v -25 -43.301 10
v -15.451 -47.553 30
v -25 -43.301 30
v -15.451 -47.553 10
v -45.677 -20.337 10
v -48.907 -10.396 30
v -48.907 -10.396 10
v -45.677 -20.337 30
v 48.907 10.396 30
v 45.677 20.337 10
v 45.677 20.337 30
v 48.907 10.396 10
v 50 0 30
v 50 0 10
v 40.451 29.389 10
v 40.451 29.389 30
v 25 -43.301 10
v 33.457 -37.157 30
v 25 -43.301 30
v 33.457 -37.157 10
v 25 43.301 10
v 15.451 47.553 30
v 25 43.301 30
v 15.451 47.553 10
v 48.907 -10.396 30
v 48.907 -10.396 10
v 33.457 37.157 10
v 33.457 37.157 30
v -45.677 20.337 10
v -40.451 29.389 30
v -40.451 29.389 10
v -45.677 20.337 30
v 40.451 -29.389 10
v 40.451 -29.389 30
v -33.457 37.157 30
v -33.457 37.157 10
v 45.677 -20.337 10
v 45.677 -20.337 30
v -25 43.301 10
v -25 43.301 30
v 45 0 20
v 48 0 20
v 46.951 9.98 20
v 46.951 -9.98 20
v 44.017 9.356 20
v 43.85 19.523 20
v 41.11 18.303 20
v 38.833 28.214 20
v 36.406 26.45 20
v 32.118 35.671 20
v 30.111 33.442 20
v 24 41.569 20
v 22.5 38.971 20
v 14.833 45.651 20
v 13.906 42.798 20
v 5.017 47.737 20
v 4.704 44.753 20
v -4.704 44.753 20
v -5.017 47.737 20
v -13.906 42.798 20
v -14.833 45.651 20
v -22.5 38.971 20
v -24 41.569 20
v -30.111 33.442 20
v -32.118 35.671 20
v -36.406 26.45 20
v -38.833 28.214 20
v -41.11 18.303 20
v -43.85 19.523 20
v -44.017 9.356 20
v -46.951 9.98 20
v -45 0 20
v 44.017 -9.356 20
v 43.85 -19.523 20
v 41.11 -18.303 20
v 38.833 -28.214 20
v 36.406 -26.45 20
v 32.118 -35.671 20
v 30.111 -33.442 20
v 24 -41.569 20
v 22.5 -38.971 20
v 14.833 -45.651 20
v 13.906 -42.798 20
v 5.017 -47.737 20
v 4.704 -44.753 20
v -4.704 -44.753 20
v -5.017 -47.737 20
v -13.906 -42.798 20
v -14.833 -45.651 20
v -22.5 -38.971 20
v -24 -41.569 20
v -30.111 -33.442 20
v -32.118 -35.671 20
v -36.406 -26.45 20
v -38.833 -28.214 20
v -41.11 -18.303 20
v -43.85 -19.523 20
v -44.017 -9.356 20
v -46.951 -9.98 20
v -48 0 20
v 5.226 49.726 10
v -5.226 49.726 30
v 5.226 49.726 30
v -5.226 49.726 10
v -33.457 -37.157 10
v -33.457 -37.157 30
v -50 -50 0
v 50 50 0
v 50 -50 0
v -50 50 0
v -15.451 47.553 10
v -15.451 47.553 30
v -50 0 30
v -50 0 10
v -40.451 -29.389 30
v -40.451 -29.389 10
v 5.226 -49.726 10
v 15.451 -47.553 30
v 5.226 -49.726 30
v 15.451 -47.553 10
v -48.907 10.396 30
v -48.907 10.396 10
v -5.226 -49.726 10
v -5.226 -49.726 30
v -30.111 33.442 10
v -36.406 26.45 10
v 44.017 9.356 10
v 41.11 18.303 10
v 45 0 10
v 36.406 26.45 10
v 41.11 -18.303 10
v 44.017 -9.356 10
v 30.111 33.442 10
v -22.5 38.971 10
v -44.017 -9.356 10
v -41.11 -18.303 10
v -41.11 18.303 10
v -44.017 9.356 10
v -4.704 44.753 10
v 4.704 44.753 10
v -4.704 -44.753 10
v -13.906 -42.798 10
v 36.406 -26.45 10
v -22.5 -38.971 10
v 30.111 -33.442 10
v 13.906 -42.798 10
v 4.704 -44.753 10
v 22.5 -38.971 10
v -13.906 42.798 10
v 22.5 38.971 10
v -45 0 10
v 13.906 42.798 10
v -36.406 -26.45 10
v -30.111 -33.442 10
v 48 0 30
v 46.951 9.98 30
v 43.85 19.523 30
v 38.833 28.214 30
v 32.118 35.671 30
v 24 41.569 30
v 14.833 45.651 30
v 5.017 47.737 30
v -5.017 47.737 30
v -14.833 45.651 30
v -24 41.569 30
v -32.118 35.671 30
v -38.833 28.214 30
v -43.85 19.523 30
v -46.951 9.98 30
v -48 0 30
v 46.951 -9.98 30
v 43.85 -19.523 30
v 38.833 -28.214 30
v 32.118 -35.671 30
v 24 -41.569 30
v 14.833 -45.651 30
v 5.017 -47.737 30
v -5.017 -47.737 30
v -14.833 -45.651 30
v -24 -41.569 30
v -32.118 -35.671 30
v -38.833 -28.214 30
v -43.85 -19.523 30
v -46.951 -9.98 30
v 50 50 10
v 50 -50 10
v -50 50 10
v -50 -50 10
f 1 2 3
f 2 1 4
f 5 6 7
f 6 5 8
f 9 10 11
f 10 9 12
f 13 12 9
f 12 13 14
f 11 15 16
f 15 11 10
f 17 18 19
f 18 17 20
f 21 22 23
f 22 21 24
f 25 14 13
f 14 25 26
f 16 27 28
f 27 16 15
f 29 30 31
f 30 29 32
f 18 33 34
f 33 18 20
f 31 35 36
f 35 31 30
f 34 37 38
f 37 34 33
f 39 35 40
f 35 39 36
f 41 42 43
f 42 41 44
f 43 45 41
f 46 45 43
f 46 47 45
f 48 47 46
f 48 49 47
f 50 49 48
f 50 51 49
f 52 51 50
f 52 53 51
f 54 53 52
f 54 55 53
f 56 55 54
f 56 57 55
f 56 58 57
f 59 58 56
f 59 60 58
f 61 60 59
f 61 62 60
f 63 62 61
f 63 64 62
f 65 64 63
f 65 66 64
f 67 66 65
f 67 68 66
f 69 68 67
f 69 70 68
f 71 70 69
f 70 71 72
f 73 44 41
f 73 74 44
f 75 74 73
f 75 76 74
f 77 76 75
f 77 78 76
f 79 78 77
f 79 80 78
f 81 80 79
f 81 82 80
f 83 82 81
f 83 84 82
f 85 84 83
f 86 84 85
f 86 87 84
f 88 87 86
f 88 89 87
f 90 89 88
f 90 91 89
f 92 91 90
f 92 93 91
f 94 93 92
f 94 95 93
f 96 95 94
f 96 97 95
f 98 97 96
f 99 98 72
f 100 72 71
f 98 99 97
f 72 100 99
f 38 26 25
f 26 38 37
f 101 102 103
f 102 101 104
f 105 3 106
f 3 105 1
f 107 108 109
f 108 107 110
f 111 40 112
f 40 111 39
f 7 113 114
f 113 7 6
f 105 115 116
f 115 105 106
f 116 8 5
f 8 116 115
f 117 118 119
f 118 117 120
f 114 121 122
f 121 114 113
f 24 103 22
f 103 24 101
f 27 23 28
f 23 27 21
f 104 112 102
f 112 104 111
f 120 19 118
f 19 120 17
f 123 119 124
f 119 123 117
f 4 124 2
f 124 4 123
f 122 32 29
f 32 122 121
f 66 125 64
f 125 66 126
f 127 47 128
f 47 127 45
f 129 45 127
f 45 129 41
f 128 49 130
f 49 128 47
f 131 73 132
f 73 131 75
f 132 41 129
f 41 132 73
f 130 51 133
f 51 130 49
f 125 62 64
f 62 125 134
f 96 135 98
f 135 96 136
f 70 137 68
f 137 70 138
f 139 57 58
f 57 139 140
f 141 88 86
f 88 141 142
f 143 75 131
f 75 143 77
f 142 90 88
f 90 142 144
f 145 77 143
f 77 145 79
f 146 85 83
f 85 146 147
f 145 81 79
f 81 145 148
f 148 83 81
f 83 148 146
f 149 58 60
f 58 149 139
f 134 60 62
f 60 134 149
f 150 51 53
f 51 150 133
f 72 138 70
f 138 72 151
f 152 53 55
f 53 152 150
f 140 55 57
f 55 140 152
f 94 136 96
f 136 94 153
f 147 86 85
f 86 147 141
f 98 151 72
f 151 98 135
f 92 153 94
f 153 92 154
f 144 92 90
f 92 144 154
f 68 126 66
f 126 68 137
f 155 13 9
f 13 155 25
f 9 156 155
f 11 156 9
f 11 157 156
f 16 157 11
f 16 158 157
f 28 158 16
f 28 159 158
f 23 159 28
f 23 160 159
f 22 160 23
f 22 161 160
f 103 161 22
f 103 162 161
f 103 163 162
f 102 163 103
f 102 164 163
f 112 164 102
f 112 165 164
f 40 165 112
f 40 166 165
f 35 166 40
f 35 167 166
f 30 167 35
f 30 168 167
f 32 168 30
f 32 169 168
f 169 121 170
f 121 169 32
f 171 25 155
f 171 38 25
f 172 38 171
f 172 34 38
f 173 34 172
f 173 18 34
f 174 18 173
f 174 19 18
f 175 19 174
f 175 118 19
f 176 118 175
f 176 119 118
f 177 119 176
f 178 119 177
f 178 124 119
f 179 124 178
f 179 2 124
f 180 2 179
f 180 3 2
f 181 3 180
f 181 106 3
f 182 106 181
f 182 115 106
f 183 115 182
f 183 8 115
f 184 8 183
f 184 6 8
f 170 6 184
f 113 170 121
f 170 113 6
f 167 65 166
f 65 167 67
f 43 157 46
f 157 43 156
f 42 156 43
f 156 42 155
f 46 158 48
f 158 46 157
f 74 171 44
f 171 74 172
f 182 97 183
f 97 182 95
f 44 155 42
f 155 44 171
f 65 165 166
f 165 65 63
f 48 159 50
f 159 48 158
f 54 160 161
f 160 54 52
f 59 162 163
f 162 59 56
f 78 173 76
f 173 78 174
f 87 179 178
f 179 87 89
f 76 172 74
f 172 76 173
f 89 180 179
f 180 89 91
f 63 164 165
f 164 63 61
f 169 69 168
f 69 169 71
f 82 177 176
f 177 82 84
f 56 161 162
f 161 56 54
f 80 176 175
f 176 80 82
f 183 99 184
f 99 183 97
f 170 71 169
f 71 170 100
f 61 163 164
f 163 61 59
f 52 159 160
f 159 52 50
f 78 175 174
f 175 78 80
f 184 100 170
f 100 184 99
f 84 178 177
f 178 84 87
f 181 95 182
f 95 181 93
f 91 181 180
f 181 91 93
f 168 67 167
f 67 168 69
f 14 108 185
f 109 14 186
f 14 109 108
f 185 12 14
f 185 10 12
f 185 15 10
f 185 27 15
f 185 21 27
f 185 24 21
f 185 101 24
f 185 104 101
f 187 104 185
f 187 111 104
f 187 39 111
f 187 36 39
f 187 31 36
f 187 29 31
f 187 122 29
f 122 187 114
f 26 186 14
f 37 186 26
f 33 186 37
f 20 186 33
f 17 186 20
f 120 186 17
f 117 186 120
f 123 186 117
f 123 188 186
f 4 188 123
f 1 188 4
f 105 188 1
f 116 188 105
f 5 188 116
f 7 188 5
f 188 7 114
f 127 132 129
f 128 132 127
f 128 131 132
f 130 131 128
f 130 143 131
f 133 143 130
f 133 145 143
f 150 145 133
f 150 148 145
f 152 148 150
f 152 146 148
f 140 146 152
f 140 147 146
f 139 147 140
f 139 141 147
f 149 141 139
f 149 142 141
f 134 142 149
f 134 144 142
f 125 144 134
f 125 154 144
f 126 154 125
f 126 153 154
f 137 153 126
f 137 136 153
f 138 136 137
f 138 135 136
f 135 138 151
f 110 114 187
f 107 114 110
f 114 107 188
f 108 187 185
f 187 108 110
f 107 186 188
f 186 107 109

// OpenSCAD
module ring(radius, width, height) {
	difference () {
		cylinder(r = radius, h = height);
		translate([0, 0, -1])
		cylinder(r = radius - width, h = height + 2);
	}
}


module ccube(width, depth, height, z_center = false) {
	if (z_center) {
		translate([-width / 2, -depth / 2, -height / 2])
		cube([width, depth, height]);
	} else {
		translate([-width / 2, -depth / 2, 0])
		cube([width, depth, height]);
	}
}

module twisted_ribs(outer_r, inner_r, height, twist, count, wall) {
	angle = 360 / count;
	linear_extrude(height, twist = twist, slices = 20) {
		for (i = [0 : (count - 1)]) {
			rotate([0, 0, i * angle])
			translate([0, inner_r])
			square([wall, outer_r - inner_r]);
		}
	}
}

ccube(100, 100, 10);
ring(50, 5, 20);
ring(50, 2, 30);
